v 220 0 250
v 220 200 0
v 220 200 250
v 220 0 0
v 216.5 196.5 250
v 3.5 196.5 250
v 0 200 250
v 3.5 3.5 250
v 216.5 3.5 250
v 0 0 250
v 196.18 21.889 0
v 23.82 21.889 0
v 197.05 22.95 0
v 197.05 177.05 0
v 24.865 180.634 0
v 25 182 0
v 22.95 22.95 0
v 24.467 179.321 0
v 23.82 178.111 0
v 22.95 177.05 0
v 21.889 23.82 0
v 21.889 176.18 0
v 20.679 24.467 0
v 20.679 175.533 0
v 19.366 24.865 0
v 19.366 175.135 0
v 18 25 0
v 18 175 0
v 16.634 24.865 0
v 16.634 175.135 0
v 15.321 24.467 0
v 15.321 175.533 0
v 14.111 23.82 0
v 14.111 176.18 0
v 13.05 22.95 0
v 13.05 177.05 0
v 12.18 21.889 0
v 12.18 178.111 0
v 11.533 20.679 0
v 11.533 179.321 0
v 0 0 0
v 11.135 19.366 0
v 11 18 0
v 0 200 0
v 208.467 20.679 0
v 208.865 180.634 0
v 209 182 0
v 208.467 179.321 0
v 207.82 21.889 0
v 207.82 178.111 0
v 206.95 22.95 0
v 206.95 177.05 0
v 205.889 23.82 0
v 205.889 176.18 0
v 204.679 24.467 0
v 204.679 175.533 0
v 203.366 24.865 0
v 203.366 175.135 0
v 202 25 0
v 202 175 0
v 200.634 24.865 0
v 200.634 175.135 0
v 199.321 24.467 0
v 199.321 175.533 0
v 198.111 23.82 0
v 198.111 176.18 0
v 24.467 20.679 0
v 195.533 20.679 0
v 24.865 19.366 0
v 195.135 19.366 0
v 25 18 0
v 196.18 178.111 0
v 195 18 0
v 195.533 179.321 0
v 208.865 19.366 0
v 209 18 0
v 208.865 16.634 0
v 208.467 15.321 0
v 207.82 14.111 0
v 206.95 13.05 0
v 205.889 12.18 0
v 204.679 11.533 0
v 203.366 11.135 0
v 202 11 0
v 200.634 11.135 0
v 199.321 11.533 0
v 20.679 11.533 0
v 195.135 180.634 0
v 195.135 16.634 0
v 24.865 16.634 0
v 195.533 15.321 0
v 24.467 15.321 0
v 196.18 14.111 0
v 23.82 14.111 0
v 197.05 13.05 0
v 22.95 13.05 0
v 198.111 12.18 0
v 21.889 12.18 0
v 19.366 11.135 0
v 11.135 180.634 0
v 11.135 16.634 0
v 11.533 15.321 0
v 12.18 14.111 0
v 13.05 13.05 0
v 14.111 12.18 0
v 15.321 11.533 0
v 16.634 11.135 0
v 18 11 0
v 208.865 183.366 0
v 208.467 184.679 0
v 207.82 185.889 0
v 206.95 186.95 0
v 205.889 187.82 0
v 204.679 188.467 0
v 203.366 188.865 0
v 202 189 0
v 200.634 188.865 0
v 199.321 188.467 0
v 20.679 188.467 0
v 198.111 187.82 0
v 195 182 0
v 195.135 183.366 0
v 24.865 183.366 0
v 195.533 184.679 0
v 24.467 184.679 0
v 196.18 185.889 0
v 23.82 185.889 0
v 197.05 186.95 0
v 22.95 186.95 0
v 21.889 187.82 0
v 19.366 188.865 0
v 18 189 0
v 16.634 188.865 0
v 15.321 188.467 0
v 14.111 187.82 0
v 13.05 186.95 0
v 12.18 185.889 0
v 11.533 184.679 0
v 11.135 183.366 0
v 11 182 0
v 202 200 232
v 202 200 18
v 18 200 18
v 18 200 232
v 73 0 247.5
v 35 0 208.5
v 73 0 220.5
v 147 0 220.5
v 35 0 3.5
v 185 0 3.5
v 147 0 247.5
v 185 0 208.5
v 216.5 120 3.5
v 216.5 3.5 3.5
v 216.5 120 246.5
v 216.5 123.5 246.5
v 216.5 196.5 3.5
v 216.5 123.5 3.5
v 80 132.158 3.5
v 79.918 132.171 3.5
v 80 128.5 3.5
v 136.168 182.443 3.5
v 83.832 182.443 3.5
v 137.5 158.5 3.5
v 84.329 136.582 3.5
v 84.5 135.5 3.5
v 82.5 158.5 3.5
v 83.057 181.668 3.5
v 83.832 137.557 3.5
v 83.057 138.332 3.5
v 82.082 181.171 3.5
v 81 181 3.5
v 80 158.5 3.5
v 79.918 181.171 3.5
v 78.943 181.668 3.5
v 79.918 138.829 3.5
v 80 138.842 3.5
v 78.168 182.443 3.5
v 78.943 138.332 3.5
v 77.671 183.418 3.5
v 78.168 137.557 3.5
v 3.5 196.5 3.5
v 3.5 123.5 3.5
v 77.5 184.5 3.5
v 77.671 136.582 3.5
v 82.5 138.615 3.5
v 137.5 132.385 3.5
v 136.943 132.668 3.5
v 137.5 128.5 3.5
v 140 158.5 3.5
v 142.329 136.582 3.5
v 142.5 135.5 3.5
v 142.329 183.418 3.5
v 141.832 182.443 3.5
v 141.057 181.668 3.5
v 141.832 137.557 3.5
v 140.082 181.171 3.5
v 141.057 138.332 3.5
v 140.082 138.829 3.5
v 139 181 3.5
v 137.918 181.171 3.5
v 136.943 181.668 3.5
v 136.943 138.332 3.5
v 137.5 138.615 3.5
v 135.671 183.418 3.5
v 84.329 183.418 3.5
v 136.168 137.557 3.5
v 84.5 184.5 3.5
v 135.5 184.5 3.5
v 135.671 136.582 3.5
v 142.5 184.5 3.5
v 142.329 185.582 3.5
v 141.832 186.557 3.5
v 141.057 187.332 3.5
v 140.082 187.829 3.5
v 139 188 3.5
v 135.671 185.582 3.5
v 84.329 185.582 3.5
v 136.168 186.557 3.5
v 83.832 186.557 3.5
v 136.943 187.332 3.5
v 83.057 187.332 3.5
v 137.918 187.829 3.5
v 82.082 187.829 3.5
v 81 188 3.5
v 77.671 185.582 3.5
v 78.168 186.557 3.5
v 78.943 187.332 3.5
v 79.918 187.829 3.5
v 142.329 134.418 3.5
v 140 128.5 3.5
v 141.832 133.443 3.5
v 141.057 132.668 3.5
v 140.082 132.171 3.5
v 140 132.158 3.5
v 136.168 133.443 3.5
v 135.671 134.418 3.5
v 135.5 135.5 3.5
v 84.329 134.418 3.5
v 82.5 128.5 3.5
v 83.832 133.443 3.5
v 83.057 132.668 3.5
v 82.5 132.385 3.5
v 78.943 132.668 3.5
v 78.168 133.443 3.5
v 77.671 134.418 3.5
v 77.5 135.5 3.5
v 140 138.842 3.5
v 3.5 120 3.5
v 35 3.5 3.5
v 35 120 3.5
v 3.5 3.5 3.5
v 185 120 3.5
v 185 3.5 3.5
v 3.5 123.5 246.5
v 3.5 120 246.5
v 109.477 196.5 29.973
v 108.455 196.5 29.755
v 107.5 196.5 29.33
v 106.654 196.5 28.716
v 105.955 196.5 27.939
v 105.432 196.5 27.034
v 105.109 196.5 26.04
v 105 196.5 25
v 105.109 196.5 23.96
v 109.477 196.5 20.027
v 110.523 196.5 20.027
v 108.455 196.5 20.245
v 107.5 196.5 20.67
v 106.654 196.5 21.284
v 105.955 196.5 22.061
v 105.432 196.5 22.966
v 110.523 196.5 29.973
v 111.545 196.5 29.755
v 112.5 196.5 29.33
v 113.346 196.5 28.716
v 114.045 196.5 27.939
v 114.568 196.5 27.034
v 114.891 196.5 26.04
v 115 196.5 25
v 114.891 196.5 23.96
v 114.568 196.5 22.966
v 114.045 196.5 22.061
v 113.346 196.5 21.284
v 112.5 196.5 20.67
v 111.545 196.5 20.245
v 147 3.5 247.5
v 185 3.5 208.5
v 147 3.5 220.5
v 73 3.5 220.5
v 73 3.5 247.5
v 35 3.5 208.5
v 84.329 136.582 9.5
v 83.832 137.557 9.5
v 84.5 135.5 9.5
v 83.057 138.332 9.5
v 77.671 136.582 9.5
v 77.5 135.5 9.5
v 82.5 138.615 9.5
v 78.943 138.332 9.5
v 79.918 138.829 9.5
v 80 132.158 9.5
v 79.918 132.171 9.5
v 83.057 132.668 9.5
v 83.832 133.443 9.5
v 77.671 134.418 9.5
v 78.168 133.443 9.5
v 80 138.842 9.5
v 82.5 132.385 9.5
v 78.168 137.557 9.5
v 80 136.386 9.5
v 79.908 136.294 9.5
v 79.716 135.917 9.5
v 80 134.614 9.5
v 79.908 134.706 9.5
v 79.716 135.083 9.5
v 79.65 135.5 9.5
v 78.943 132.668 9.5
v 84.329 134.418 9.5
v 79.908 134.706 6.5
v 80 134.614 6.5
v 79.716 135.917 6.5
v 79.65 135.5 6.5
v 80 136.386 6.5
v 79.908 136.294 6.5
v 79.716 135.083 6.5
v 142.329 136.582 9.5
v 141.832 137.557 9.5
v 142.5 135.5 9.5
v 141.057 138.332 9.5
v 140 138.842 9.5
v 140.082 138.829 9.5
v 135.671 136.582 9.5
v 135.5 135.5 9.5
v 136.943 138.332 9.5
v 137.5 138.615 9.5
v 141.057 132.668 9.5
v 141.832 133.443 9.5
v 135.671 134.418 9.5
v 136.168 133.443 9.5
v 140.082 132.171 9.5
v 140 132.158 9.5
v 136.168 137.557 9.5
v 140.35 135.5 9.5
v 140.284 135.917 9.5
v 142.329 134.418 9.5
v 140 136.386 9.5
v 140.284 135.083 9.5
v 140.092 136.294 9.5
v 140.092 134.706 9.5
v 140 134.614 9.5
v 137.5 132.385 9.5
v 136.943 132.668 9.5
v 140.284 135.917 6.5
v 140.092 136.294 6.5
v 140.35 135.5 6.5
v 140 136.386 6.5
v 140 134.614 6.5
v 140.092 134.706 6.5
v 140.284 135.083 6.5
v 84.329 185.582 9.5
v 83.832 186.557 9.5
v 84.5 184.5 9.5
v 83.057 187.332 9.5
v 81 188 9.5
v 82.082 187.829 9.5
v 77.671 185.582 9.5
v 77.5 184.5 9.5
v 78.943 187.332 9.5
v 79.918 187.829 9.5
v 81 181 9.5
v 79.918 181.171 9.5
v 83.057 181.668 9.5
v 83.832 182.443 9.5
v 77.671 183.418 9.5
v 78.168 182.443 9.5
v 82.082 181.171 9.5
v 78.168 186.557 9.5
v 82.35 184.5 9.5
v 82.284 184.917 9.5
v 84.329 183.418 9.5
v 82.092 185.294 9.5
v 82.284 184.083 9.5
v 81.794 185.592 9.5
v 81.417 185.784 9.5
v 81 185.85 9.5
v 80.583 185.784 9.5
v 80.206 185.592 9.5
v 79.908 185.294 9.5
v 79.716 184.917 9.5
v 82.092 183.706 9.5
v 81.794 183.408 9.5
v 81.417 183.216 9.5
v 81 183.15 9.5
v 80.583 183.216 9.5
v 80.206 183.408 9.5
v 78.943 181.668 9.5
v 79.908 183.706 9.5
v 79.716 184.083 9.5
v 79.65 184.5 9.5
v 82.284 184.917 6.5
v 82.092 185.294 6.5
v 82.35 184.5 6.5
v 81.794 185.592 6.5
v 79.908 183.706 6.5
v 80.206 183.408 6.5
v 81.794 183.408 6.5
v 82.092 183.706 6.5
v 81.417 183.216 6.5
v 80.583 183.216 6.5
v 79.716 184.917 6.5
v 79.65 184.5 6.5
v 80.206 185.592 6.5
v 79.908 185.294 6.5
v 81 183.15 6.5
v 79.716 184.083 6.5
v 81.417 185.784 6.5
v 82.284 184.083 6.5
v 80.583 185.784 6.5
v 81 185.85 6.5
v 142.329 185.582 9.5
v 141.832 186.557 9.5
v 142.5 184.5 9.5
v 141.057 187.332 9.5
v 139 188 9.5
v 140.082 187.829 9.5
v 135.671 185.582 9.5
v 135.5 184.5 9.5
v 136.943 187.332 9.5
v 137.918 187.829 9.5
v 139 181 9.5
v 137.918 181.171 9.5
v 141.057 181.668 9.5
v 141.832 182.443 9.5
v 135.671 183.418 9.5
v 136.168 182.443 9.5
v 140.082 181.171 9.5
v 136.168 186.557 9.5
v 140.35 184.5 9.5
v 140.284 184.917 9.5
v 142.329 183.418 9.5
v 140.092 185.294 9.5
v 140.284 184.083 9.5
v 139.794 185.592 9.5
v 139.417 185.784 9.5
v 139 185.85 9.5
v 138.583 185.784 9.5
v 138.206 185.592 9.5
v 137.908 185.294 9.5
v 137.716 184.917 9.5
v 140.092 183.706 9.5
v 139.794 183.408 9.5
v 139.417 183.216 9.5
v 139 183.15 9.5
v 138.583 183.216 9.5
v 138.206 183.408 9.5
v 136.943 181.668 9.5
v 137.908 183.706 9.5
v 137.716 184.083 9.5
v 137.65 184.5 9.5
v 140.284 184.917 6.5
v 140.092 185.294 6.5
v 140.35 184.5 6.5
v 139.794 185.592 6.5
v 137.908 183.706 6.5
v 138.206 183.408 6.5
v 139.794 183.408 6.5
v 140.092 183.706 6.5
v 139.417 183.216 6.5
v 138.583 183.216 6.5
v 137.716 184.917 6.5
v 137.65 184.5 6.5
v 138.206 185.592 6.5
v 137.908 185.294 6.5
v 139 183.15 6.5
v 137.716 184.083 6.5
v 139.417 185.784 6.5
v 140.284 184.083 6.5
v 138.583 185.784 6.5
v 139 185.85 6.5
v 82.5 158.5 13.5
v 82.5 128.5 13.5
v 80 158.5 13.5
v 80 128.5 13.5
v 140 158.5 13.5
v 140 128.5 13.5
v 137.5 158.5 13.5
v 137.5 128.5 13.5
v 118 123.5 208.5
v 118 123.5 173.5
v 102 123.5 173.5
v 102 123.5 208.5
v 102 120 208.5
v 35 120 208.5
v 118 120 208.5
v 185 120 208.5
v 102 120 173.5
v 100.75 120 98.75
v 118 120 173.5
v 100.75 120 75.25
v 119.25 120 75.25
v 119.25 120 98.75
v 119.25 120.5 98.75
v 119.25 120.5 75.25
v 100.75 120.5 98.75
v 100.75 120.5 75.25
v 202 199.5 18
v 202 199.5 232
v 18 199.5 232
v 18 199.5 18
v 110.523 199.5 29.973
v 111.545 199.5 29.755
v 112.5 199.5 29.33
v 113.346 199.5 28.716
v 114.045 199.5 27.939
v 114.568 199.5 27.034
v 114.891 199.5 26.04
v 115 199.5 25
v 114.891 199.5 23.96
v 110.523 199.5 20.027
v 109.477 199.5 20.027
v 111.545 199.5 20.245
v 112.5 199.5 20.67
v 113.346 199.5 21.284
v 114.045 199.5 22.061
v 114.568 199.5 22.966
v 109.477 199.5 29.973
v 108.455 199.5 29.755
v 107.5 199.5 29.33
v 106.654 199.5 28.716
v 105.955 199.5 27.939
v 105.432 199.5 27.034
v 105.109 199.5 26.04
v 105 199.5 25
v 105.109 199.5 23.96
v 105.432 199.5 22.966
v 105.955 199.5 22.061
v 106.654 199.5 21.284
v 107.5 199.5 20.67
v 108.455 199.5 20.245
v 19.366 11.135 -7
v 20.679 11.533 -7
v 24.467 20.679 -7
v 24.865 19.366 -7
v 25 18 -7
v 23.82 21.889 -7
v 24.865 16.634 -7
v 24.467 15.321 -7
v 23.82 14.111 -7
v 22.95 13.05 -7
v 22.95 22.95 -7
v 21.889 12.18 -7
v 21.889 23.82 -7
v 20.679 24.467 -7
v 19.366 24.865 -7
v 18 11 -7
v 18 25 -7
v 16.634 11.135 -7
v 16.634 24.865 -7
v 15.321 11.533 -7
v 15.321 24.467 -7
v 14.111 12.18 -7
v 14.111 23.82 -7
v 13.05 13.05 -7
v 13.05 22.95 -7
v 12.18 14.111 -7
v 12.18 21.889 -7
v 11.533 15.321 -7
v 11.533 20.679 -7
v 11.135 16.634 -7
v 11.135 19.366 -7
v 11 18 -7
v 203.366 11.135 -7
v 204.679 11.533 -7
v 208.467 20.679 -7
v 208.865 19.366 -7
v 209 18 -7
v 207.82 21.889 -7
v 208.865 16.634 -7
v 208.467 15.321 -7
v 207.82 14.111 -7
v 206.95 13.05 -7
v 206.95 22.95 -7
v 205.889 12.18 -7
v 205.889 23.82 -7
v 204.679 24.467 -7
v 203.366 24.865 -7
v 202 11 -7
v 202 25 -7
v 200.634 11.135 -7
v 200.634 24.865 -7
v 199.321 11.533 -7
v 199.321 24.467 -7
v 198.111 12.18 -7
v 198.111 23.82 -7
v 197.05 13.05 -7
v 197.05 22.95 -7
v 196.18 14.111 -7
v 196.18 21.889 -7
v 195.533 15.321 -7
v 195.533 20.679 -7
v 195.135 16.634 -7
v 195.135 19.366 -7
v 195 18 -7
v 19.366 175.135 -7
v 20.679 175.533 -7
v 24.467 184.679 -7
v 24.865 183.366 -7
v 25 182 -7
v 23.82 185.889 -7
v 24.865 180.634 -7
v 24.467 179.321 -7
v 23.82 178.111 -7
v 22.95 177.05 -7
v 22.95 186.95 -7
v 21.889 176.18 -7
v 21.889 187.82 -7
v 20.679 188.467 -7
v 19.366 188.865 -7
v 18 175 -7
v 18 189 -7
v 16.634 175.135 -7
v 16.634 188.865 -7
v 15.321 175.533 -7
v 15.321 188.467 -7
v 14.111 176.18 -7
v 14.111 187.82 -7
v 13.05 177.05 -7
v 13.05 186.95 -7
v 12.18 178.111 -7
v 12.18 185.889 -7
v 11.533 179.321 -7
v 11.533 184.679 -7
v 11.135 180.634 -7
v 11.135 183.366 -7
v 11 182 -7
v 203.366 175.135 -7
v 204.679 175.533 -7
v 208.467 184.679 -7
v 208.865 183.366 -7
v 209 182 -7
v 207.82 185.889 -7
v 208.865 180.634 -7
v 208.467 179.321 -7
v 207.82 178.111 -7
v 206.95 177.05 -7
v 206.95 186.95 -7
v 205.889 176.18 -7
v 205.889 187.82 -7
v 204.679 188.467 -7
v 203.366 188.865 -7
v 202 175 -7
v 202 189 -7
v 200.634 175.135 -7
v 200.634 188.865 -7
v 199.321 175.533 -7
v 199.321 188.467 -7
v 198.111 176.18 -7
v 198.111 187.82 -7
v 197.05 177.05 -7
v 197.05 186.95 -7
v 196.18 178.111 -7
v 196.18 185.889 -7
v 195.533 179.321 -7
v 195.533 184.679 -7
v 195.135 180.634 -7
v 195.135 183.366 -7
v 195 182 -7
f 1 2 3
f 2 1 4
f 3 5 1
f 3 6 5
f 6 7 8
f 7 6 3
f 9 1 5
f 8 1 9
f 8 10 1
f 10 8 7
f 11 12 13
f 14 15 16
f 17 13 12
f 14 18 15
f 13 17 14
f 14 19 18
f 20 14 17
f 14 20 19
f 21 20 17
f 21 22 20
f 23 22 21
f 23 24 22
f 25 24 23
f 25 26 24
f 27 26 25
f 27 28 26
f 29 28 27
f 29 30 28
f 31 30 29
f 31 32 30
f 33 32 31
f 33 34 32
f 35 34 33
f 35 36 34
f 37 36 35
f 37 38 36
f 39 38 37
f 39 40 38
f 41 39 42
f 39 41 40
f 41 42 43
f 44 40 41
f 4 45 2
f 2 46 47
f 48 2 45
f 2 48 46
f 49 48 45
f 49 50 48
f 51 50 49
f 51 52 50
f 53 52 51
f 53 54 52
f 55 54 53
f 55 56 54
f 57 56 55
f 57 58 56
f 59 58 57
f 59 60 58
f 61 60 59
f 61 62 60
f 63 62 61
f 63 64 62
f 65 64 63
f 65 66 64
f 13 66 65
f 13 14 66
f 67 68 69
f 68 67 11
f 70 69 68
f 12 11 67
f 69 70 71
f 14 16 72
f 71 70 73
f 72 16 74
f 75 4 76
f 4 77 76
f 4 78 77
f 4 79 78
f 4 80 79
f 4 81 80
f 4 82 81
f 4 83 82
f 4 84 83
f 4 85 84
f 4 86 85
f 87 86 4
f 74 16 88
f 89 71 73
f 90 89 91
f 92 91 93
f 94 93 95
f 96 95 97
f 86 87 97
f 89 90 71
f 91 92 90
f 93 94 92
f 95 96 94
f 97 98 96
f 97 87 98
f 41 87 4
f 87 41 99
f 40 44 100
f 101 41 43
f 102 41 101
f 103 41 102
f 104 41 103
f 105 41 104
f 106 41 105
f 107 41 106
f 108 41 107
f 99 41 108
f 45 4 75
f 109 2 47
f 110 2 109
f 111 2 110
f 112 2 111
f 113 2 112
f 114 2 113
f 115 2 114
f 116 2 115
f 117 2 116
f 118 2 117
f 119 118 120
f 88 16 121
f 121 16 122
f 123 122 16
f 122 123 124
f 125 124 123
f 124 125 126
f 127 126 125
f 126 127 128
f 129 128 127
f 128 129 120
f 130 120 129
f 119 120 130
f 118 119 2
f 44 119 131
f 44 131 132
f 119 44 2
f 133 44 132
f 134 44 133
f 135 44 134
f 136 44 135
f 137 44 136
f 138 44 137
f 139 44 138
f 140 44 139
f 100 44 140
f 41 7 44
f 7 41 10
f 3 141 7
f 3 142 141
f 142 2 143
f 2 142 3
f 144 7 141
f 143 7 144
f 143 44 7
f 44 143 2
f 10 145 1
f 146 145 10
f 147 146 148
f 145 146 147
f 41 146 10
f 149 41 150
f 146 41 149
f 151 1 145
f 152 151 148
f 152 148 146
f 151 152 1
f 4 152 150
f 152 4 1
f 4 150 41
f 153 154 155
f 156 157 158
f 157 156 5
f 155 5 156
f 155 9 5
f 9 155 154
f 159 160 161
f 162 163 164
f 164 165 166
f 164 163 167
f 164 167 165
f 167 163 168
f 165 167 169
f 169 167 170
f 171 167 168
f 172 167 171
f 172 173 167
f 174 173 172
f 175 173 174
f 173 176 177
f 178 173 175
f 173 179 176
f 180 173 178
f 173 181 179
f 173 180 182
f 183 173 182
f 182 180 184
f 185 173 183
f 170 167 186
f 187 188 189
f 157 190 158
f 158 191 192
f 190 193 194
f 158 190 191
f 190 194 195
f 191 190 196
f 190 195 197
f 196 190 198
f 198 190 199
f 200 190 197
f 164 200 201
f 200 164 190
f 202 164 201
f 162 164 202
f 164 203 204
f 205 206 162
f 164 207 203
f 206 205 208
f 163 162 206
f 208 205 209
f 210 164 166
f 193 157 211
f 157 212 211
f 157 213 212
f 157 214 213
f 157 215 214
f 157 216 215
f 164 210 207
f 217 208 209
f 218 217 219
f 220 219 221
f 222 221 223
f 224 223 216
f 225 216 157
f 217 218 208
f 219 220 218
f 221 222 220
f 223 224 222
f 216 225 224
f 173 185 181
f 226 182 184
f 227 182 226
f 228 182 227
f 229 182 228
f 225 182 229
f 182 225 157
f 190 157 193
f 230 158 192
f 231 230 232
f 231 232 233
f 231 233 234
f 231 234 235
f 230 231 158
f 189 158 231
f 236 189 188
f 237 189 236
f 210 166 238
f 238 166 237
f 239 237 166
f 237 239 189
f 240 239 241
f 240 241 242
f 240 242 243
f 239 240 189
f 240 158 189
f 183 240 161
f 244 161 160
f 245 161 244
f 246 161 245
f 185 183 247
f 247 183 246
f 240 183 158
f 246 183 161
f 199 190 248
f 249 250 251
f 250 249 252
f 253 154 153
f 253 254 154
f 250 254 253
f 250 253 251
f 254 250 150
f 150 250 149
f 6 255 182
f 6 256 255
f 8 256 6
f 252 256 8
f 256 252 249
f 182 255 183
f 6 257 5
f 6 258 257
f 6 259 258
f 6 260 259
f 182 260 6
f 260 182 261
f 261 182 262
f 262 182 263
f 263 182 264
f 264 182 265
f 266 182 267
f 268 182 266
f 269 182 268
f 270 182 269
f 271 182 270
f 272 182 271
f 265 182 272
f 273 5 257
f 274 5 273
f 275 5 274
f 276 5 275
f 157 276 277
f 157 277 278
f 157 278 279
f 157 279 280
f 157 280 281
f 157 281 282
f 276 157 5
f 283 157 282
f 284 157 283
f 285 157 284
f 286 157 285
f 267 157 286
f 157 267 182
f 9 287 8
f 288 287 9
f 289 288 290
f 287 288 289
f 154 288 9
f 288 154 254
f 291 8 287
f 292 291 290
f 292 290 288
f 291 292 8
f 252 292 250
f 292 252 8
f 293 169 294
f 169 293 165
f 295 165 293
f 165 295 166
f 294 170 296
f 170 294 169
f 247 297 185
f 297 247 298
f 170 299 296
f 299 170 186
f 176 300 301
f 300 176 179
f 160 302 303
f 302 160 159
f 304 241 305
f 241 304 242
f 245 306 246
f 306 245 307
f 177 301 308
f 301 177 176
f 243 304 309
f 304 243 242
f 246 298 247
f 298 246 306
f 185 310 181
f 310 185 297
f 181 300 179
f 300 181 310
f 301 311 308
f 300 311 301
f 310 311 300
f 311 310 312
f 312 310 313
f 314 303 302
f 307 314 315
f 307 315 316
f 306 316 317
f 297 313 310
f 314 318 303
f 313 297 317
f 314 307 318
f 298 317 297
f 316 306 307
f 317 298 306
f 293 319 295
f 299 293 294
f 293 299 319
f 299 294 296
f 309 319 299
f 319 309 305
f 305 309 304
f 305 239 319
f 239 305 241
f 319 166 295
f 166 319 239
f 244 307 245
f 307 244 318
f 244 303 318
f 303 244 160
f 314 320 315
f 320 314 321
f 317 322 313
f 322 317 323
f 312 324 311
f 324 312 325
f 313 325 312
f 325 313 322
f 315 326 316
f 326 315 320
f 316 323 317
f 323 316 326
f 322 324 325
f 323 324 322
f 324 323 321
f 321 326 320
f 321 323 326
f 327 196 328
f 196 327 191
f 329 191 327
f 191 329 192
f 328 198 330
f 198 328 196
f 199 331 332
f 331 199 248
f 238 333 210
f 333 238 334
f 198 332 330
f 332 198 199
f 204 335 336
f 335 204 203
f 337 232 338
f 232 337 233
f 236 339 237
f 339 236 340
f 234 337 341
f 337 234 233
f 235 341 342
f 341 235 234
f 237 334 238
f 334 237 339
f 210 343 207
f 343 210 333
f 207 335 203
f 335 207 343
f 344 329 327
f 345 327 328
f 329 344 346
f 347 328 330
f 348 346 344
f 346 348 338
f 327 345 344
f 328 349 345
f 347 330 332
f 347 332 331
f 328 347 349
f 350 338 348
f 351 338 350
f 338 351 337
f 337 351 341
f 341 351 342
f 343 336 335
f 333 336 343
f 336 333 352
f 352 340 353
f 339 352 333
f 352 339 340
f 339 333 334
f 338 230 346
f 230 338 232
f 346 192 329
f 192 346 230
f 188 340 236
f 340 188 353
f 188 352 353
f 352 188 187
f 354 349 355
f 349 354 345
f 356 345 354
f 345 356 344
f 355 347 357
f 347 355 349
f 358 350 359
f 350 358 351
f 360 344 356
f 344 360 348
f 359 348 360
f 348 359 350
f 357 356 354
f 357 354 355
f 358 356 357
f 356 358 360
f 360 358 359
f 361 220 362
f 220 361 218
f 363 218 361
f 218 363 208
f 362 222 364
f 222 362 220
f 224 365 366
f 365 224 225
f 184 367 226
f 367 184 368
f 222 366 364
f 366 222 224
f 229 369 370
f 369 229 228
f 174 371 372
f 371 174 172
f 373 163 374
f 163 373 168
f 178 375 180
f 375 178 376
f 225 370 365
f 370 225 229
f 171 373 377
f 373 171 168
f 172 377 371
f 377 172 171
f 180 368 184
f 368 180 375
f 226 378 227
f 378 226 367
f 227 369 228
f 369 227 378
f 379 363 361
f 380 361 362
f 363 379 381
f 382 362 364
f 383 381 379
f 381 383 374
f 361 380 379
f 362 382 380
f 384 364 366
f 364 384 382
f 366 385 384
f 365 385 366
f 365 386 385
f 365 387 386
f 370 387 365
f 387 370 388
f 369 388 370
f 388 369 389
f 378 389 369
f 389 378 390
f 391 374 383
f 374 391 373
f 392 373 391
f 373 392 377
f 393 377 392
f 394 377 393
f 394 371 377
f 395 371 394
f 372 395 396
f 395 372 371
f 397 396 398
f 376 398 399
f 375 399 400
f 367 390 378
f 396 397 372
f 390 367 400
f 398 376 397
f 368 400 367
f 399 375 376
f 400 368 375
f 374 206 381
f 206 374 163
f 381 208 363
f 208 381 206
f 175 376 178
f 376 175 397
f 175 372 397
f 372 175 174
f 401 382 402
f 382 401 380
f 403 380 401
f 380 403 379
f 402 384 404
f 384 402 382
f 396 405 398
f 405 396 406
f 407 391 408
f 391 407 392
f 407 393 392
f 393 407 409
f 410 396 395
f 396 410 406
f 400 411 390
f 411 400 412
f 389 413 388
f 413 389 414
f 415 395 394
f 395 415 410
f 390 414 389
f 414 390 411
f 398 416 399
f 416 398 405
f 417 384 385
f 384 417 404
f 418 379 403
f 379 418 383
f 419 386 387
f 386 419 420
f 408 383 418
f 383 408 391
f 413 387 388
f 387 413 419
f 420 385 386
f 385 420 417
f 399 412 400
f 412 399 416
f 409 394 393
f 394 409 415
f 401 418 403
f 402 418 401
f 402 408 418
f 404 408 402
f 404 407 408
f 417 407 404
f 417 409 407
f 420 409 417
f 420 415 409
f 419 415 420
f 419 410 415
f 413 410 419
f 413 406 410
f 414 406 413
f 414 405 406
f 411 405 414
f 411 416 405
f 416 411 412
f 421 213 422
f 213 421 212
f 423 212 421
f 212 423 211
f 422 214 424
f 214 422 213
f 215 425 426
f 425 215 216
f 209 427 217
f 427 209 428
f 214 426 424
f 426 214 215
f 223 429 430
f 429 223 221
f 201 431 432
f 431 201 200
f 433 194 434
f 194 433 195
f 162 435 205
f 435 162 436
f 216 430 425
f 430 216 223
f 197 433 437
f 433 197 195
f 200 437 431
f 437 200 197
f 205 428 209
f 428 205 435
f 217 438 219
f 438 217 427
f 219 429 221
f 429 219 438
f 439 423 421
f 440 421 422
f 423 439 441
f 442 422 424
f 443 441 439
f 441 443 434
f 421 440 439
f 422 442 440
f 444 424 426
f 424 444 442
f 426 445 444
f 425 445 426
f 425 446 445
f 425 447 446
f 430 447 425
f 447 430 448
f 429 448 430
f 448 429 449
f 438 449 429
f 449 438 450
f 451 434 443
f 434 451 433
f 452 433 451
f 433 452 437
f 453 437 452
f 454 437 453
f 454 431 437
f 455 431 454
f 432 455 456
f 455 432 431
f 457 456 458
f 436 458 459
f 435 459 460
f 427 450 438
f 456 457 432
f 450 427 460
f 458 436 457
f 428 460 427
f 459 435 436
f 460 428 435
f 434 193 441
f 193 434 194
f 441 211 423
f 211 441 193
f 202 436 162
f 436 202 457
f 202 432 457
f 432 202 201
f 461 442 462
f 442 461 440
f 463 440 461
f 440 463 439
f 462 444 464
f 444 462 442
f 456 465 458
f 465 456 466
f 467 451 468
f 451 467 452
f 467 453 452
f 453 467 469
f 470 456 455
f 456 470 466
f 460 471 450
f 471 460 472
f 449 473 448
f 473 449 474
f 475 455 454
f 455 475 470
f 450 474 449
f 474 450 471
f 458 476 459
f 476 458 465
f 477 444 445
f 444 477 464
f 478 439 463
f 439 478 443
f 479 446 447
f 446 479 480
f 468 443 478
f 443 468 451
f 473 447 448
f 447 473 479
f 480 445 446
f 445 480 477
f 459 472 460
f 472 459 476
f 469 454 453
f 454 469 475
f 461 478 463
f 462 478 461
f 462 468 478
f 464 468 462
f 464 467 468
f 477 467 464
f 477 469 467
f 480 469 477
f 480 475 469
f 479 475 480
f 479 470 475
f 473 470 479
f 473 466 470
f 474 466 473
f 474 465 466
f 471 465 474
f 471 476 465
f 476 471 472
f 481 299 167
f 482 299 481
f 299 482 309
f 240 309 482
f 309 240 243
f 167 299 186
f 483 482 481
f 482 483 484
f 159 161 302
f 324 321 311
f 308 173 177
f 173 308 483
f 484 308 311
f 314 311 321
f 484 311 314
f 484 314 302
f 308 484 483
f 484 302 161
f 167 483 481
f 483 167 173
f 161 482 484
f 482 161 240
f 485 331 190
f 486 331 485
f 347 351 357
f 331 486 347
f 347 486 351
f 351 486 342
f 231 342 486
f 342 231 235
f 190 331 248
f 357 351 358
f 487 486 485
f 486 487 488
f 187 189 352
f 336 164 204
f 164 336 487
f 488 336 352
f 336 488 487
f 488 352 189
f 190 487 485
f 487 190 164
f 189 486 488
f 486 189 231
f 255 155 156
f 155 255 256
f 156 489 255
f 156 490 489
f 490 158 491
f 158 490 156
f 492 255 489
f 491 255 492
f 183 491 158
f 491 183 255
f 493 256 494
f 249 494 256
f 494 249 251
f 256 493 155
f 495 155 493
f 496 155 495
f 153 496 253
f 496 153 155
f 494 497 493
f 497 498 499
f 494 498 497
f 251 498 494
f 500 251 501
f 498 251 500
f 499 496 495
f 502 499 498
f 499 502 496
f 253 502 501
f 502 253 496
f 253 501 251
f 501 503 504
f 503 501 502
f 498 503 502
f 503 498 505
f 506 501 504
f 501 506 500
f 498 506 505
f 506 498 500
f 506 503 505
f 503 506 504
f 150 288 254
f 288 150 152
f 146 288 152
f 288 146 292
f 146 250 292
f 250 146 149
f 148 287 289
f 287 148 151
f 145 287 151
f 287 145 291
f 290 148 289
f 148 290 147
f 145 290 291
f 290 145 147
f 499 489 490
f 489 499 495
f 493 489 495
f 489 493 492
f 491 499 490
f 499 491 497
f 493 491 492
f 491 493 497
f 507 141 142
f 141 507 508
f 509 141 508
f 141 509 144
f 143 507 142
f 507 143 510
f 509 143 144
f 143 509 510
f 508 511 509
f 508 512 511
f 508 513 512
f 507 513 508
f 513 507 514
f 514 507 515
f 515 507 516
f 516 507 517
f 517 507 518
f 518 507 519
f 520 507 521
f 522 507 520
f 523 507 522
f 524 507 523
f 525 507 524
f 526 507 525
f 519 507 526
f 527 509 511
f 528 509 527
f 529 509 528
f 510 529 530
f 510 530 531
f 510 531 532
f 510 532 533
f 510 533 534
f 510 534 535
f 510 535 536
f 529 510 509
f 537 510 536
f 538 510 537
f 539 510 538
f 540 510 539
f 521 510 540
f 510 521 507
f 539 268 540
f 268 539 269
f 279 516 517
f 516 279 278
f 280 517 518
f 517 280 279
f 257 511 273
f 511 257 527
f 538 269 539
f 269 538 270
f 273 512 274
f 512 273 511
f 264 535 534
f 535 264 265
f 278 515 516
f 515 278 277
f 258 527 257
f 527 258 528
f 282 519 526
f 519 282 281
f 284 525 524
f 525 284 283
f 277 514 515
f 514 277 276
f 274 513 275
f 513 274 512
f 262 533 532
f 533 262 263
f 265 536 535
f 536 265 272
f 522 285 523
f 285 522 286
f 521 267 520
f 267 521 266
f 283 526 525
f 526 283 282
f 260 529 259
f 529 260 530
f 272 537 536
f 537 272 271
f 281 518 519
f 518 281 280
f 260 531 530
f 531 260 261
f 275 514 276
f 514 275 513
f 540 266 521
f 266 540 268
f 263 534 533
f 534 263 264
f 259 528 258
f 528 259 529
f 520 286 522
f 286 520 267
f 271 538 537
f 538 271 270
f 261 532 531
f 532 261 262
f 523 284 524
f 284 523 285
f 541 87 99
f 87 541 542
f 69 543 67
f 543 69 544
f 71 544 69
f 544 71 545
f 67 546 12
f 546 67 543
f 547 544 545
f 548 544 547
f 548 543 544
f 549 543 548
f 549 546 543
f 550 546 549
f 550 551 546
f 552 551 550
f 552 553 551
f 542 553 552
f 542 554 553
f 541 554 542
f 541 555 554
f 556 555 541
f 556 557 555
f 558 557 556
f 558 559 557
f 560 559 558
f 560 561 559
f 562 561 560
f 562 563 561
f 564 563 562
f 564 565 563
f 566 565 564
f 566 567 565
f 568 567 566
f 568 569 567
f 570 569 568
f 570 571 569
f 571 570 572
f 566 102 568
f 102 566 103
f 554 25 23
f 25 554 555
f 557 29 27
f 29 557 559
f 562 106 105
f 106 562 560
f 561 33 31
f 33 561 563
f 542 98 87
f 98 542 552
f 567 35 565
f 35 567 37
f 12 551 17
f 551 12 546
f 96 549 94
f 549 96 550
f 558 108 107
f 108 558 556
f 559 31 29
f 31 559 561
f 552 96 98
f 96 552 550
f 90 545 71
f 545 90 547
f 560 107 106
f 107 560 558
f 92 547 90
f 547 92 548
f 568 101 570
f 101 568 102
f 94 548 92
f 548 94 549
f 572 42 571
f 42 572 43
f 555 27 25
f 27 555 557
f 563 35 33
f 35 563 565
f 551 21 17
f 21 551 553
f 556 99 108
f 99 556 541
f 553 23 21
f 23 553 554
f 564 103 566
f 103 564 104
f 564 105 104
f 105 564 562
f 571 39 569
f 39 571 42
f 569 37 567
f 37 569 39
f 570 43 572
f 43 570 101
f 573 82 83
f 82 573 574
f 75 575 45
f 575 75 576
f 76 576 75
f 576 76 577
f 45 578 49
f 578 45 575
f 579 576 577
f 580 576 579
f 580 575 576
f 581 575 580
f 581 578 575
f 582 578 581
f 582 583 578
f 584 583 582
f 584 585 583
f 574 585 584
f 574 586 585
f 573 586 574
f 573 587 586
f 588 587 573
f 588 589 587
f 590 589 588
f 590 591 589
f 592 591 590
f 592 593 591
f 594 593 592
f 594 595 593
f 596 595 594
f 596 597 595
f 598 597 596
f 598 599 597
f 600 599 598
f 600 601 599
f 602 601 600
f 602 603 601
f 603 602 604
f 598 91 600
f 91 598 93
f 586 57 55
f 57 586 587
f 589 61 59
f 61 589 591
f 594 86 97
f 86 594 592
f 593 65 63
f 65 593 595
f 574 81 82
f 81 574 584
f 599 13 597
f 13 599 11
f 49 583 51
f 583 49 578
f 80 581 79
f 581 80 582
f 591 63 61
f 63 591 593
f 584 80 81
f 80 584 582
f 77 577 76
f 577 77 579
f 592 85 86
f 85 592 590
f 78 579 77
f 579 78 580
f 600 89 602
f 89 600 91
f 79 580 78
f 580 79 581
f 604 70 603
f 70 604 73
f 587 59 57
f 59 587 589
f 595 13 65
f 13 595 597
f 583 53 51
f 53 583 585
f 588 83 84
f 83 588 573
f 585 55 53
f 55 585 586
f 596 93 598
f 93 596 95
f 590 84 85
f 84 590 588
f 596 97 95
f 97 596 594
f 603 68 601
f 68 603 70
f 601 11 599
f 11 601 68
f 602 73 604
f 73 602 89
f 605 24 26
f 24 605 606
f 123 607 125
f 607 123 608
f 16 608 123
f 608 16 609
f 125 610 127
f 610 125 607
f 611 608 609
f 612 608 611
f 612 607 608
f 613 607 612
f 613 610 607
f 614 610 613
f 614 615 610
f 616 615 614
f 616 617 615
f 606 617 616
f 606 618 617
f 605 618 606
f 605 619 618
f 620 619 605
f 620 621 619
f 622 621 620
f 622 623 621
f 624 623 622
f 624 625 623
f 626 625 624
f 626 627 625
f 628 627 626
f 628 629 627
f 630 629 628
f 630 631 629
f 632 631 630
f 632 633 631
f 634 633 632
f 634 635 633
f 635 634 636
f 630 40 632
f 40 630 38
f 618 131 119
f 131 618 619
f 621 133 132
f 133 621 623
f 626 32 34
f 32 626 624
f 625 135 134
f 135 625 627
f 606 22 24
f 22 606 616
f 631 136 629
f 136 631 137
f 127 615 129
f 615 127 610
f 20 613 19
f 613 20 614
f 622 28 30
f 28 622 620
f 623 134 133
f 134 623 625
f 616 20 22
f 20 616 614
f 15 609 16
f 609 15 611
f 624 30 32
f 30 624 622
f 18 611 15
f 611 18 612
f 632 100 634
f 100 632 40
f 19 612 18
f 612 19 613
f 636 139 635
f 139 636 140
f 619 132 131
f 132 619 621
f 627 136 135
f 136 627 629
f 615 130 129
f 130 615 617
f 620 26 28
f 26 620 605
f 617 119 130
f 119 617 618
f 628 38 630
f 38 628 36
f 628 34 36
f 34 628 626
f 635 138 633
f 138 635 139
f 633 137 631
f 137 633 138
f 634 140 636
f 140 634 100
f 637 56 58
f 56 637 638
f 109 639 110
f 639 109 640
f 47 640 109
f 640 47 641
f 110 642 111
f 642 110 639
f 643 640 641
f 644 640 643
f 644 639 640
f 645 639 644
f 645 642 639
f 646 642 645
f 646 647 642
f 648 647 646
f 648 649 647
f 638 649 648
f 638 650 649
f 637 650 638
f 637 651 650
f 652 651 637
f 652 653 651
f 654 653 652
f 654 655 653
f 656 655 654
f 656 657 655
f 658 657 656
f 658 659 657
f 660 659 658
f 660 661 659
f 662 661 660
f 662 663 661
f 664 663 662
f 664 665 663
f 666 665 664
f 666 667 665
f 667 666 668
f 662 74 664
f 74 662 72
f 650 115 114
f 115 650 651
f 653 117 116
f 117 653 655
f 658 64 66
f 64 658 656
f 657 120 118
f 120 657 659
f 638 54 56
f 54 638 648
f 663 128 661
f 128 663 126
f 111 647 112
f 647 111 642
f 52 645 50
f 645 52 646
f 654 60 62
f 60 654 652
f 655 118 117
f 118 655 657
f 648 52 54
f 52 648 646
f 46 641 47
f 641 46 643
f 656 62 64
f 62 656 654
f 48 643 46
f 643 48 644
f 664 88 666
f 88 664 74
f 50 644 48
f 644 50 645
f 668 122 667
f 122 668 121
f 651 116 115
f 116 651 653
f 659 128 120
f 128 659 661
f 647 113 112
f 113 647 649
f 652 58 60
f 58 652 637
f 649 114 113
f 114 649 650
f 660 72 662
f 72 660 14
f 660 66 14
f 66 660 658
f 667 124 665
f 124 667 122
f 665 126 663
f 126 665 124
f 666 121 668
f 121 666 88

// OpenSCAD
// ============================================================
//  AquaFlow — Full Dispenser Shell  v1.0
// ============================================================
//
//  Build footprint:  220 × 200 × 250 mm  (W × D × H)
//  Bambu P1S limit:  256 × 256 × 256 mm  ✓  FITS
//
//  LAYOUT (top-view, Y axis = front-to-back)
//  ┌──────────────────────────────┐ ← rear wall (Y = 200)
//  │   Electronics Bay  (73 mm)  │   Pi, wiring, flow sensor
//  ├──────────────────────────────┤ ← partition wall (Y = 120)
//  │      Cup Bay  (120 mm)      │   pump tube drops in from top
//  └──────────────────────────────┘ ← front face (Y = 0)
//    open to user → cup slides in
//
//  FRONT FACE (Z axis = bottom-to-top)
//  ┌──────────────────┐  ← top wall
//  │    LCD window    │  at Z ≈ 220 mm
//  │                  │
//  │                  │
//  │   CUP BAY OPEN   │  Z = 3.5 → 203.5 mm (200 mm tall)
//  │                  │
//  └──────────────────┘  ← floor
//
//  HOW TO USE:
//    F5  = fast preview (orange, good for layout checks)
//    F6  = full render  (grey, export-ready)
//    File → Export → Export as STL
//
//  PRINT SETTINGS (recommended for James Watt South Bambu P1S):
//    Material:      PLA
//    Layer height:  0.2 mm
//    Infill:        20–25 % gyroid
//    Walls:         3 perimeters
//    Supports:      REQUIRED — cup bay leaves a large overhang
//    Estimated time: 16–22 h
//    Estimated mass: ~500 g
// ============================================================


// ============================================================
//  PARAMETERS  ← edit these to tune the build
// ============================================================

/* [Shell] */
body_w  = 220;      // outer width  (mm)
body_d  = 200;      // outer depth, front‑to‑back (mm)
body_h  = 250;      // outer height (mm)
wall    = 3.5;      // shell wall thickness (mm)

/* [Cup Bay — opened from front face] */
// Standard large McDonald's / KFC cup: ~107 mm top dia, ~180 mm tall
bay_w   = 150;      // bay width  (cups to ~115 mm dia with clearance)
bay_d   = 120;      // bay depth, front face → partition wall
bay_h   = 205;      // bay height (5 mm clearance over a 200 mm cup)
// NOTE: bay opens fully at front face and from the floor up to bay_h

/* [Nozzle / Tube Port] */
// 6 mm silicone tube, 1 mm wall clearance each side → 8 mm hole
tube_od = 8;
// Port is centred in X over the cup bay, emerges through the top wall
// The water tube routes from the electronics bay, up and over the partition

/* [LCD Window — 1602‑style, 16 × 2 chars] */
// Visible display area of a standard 1602 LCD: ~72 mm × 25 mm
lcd_w        = 74;  // window width  (add 2 mm tolerance)
lcd_h        = 27;  // window height (add 2 mm tolerance)
lcd_gap_above_bay = 12; // solid wall between top of cup bay and LCD bottom

/* [APDS‑9960 Gesture Sensor — board 15.5 × 20.5 mm] */
// Mounted flush in partition wall, facing the cup bay (toward front)
sns_brd_w   = 15.5; // actual board width
sns_brd_h   = 20.5; // actual board height
sns_tol     = 1.5;  // press‑fit tolerance each side
sns_pocket_w = sns_brd_w + sns_tol * 2; // = 18.5 mm
sns_pocket_h = sns_brd_h + sns_tol * 2; // = 23.5 mm
sns_pocket_d = 2.5; // pocket depth (PCB sits 2.5 mm into wall, chip faces forward)
sns_window   = 9;   // square through‑hole for sensor chip line‑of‑sight
// Sensor sits at 35 % of bay height — good cup‑detection height
sns_z_pct    = 0.35;

/* [YF‑S401 Flow Sensor mounting channel — 58 × 35 × 27 mm body] */
// The flow sensor sits inline in the water tube inside the electronics bay.
// A clip rail is printed on the electronics bay floor to locate it.
fs_w = 60;  // rail slot width  (sensor body 58 mm + 2 mm clearance)
fs_h = 10;  // clip rail height

/* [Raspberry Pi — standard mounting hole pattern Pi 2/3/4] */
// Hole‑to‑hole distances: 58 mm (X) × 49 mm (Y)
pi_hole_d  = 2.7;   // M2.5 clearance diameter
pi_x_span  = 58;    // mounting hole X span
pi_y_span  = 49;    // mounting hole Y span
pi_post_d  = 7;     // pillar outer diameter
pi_post_h  = 6;     // pillar height (PCB standoff)
// Pi centred in electronics bay width; 12 mm behind partition wall
// Electronics bay: Y = (bay_d + wall)  to  Y = (body_d − wall)
//   depth = 200 − 3.5 − 123.5 = 73 mm  → Pi Y‑span 49 mm + 12 + some margin ✓

/* [Rear Inlet — external reservoir/pump tube entry] */
// The JT80SL pump sits submerged in an external water bottle/reservoir.
// The outlet tube enters the rear wall of the dispenser here.
inlet_d = 10;   // tube entry hole (6 mm tube, generous clearance)
inlet_z = 25;   // height from base floor (near bottom, below electronics)

/* [Rear Access Panel] */
// A large opening in the back wall for wiring, Pi access, flow sensor, etc.
// A matching cut‑out cover plate can be printed separately.
access_border = 18; // solid border kept around the access panel

/* [Rubber Feet] */
foot_d   = 14;  // diameter
foot_h   = 7;   // height (elevates shell, protects countertop)
foot_off = 18;  // inset from corner


// ============================================================
//  DERIVED VALUES  (do not edit)
// ============================================================

inner_w = body_w - wall * 2;
inner_d = body_d - wall * 2;

// Cup bay left/right edges (centred in X)
bay_x0  = (body_w - bay_w) / 2;

// LCD window position
lcd_z0  = wall + bay_h + lcd_gap_above_bay;
lcd_x0  = (body_w - lcd_w) / 2;

// Sensor position on partition wall
sns_z0  = wall + bay_h * sns_z_pct;
sns_x0  = (body_w - sns_pocket_w) / 2;

// Pi mounting posts — centred in width, 12 mm behind partition
pi_x0   = (body_w - pi_x_span) / 2;
pi_y0   = bay_d + wall + 12;

// Flow sensor clip rail: centred in width, on electronics bay floor
fs_x0   = (body_w - fs_w) / 2;
fs_y0   = bay_d + wall + 5;


// ============================================================
//  MODULES
// ============================================================

// --- 1. Outer shell: all four walls + floor, open top -------------
module shell() {
    difference() {
        cube([body_w, body_d, body_h]);
        // Hollow interior
        translate([wall, wall, wall])
            cube([inner_w, inner_d, body_h]);
    }
}

// --- 2. Partition wall: separates cup bay from electronics bay ----
module partition_wall() {
    translate([wall, bay_d, wall])
        cube([inner_w, wall, body_h - 2 * wall]);
}

// --- 3. Wire/tube pass-through at the top of the partition --------
//   16 mm wide × 35 mm tall slot so the water tube and signal
//   wires can cross from the electronics bay into the cup bay.
module partition_passthrough() {
    translate([body_w / 2 - 8, bay_d - 0.5, wall + bay_h - 35])
        cube([16, wall + 1, 35]);
}

// --- 4. Cup bay void: hollows out the front section ---------------
module cup_bay_void() {
    // Removes: front wall (Y 0→bay_d) and interior bay space
    // Leaves floor (Z starts at wall), leaves side walls of bay
    translate([bay_x0, 0, wall])
        cube([bay_w, bay_d, bay_h]);
}

// --- 5. LCD window: through‑hole in front wall, above cup bay -----
module lcd_window() {
    translate([lcd_x0, -1, lcd_z0])
        cube([lcd_w, wall + 2, lcd_h]);
}

// --- 6. Nozzle port: tube exits top of shell above cup bay --------
//   Water falls from this port down into the waiting cup.
module nozzle_port() {
    translate([body_w / 2, bay_d / 2, body_h - 0.5])
        cylinder(d = tube_od, h = wall + 1, $fn = 30);
}

// --- 7. Sensor pocket in partition wall (PCB press‑fit) -----------
module sensor_recess() {
    // a) PCB pocket: board is pressed from the cup‑bay side
    translate([sns_x0, bay_d - sns_pocket_d, sns_z0])
        cube([sns_pocket_w, sns_pocket_d + 0.5, sns_pocket_h]);

    // b) Sensor through‑window: centred in the pocket, passes fully
    //    through the partition wall so the sensor chip can see the cup
    translate([
        body_w / 2 - sns_window / 2,
        bay_d - wall - 0.5,
        sns_z0 + (sns_pocket_h - sns_window) / 2
    ])
        cube([sns_window, wall + 1, sns_window]);
}

// --- 8. Rear access panel ----------------------------------------
//   Large opening in back wall. Keep access_border of solid wall.
module rear_access() {
    translate([
        access_border,
        body_d - 0.5,
        access_border
    ])
        cube([
            body_w - access_border * 2,
            wall + 1,
            body_h - access_border * 2
        ]);
}

// --- 9. Rear tube inlet: external reservoir hose entry hole -------
module rear_tube_inlet() {
    translate([body_w / 2, body_d - 0.5, inlet_z])
        rotate([90, 0, 0])
            cylinder(d = inlet_d, h = wall + 1, $fn = 30);
}

// --- 10. Raspberry Pi mounting post (one pillar) ------------------
module pi_post(x, y) {
    translate([x, y, wall]) {
        difference() {
            cylinder(d = pi_post_d, h = pi_post_h, $fn = 20);
            // Blind M2.5 screw hole at top (3 mm deep)
            translate([0, 0, pi_post_h - 3])
                cylinder(d = pi_hole_d, h = 3.5, $fn = 20);
        }
    }
}

// --- 11. Flow sensor clip rail (holds YF‑S401 inline in tube) -----
//   Two small walls form a slot on the electronics bay floor.
module flow_sensor_rail() {
    translate([fs_x0, fs_y0, wall]) {
        // Left clip
        cube([2.5, 30, fs_h]);
        // Right clip
        translate([fs_w - 2.5, 0, 0])
            cube([2.5, 30, fs_h]);
    }
}

// --- 12. Rubber foot (extends below base plate) -------------------
module foot(x, y) {
    translate([x, y, -foot_h])
        cylinder(d = foot_d, h = foot_h, $fn = 32);
}


// ============================================================
//  ASSEMBLY
// ============================================================

difference() {
    union() {
        shell();                            // outer shell with walls + floor

        partition_wall();                   // dry/wet divider

        // --- Raspberry Pi mounting posts (electronics bay) ---
        pi_post(pi_x0,              pi_y0);
        pi_post(pi_x0 + pi_x_span,  pi_y0);
        pi_post(pi_x0,              pi_y0 + pi_y_span);
        pi_post(pi_x0 + pi_x_span,  pi_y0 + pi_y_span);

        // --- Flow sensor clip rail (electronics bay floor) ---
        flow_sensor_rail();
    }

    // ---- Subtractions (all the holes and voids) ----

    cup_bay_void();             // 1. hollow cup bay from front face
    lcd_window();               // 2. LCD window above cup bay
    nozzle_port();              // 3. tube port in top wall
    sensor_recess();            // 4. APDS‑9960 pocket + through‑window
    partition_passthrough();    // 5. tube/wire slot at top of partition
    rear_access();              // 6. electronics access panel in rear wall
    rear_tube_inlet();          // 7. external reservoir tube entry (rear, low)
}

// --- Feet: added outside difference() so they aren't subtracted ---
foot(foot_off,           foot_off);
foot(body_w - foot_off,  foot_off);
foot(foot_off,           body_d - foot_off);
foot(body_w - foot_off,  body_d - foot_off);
